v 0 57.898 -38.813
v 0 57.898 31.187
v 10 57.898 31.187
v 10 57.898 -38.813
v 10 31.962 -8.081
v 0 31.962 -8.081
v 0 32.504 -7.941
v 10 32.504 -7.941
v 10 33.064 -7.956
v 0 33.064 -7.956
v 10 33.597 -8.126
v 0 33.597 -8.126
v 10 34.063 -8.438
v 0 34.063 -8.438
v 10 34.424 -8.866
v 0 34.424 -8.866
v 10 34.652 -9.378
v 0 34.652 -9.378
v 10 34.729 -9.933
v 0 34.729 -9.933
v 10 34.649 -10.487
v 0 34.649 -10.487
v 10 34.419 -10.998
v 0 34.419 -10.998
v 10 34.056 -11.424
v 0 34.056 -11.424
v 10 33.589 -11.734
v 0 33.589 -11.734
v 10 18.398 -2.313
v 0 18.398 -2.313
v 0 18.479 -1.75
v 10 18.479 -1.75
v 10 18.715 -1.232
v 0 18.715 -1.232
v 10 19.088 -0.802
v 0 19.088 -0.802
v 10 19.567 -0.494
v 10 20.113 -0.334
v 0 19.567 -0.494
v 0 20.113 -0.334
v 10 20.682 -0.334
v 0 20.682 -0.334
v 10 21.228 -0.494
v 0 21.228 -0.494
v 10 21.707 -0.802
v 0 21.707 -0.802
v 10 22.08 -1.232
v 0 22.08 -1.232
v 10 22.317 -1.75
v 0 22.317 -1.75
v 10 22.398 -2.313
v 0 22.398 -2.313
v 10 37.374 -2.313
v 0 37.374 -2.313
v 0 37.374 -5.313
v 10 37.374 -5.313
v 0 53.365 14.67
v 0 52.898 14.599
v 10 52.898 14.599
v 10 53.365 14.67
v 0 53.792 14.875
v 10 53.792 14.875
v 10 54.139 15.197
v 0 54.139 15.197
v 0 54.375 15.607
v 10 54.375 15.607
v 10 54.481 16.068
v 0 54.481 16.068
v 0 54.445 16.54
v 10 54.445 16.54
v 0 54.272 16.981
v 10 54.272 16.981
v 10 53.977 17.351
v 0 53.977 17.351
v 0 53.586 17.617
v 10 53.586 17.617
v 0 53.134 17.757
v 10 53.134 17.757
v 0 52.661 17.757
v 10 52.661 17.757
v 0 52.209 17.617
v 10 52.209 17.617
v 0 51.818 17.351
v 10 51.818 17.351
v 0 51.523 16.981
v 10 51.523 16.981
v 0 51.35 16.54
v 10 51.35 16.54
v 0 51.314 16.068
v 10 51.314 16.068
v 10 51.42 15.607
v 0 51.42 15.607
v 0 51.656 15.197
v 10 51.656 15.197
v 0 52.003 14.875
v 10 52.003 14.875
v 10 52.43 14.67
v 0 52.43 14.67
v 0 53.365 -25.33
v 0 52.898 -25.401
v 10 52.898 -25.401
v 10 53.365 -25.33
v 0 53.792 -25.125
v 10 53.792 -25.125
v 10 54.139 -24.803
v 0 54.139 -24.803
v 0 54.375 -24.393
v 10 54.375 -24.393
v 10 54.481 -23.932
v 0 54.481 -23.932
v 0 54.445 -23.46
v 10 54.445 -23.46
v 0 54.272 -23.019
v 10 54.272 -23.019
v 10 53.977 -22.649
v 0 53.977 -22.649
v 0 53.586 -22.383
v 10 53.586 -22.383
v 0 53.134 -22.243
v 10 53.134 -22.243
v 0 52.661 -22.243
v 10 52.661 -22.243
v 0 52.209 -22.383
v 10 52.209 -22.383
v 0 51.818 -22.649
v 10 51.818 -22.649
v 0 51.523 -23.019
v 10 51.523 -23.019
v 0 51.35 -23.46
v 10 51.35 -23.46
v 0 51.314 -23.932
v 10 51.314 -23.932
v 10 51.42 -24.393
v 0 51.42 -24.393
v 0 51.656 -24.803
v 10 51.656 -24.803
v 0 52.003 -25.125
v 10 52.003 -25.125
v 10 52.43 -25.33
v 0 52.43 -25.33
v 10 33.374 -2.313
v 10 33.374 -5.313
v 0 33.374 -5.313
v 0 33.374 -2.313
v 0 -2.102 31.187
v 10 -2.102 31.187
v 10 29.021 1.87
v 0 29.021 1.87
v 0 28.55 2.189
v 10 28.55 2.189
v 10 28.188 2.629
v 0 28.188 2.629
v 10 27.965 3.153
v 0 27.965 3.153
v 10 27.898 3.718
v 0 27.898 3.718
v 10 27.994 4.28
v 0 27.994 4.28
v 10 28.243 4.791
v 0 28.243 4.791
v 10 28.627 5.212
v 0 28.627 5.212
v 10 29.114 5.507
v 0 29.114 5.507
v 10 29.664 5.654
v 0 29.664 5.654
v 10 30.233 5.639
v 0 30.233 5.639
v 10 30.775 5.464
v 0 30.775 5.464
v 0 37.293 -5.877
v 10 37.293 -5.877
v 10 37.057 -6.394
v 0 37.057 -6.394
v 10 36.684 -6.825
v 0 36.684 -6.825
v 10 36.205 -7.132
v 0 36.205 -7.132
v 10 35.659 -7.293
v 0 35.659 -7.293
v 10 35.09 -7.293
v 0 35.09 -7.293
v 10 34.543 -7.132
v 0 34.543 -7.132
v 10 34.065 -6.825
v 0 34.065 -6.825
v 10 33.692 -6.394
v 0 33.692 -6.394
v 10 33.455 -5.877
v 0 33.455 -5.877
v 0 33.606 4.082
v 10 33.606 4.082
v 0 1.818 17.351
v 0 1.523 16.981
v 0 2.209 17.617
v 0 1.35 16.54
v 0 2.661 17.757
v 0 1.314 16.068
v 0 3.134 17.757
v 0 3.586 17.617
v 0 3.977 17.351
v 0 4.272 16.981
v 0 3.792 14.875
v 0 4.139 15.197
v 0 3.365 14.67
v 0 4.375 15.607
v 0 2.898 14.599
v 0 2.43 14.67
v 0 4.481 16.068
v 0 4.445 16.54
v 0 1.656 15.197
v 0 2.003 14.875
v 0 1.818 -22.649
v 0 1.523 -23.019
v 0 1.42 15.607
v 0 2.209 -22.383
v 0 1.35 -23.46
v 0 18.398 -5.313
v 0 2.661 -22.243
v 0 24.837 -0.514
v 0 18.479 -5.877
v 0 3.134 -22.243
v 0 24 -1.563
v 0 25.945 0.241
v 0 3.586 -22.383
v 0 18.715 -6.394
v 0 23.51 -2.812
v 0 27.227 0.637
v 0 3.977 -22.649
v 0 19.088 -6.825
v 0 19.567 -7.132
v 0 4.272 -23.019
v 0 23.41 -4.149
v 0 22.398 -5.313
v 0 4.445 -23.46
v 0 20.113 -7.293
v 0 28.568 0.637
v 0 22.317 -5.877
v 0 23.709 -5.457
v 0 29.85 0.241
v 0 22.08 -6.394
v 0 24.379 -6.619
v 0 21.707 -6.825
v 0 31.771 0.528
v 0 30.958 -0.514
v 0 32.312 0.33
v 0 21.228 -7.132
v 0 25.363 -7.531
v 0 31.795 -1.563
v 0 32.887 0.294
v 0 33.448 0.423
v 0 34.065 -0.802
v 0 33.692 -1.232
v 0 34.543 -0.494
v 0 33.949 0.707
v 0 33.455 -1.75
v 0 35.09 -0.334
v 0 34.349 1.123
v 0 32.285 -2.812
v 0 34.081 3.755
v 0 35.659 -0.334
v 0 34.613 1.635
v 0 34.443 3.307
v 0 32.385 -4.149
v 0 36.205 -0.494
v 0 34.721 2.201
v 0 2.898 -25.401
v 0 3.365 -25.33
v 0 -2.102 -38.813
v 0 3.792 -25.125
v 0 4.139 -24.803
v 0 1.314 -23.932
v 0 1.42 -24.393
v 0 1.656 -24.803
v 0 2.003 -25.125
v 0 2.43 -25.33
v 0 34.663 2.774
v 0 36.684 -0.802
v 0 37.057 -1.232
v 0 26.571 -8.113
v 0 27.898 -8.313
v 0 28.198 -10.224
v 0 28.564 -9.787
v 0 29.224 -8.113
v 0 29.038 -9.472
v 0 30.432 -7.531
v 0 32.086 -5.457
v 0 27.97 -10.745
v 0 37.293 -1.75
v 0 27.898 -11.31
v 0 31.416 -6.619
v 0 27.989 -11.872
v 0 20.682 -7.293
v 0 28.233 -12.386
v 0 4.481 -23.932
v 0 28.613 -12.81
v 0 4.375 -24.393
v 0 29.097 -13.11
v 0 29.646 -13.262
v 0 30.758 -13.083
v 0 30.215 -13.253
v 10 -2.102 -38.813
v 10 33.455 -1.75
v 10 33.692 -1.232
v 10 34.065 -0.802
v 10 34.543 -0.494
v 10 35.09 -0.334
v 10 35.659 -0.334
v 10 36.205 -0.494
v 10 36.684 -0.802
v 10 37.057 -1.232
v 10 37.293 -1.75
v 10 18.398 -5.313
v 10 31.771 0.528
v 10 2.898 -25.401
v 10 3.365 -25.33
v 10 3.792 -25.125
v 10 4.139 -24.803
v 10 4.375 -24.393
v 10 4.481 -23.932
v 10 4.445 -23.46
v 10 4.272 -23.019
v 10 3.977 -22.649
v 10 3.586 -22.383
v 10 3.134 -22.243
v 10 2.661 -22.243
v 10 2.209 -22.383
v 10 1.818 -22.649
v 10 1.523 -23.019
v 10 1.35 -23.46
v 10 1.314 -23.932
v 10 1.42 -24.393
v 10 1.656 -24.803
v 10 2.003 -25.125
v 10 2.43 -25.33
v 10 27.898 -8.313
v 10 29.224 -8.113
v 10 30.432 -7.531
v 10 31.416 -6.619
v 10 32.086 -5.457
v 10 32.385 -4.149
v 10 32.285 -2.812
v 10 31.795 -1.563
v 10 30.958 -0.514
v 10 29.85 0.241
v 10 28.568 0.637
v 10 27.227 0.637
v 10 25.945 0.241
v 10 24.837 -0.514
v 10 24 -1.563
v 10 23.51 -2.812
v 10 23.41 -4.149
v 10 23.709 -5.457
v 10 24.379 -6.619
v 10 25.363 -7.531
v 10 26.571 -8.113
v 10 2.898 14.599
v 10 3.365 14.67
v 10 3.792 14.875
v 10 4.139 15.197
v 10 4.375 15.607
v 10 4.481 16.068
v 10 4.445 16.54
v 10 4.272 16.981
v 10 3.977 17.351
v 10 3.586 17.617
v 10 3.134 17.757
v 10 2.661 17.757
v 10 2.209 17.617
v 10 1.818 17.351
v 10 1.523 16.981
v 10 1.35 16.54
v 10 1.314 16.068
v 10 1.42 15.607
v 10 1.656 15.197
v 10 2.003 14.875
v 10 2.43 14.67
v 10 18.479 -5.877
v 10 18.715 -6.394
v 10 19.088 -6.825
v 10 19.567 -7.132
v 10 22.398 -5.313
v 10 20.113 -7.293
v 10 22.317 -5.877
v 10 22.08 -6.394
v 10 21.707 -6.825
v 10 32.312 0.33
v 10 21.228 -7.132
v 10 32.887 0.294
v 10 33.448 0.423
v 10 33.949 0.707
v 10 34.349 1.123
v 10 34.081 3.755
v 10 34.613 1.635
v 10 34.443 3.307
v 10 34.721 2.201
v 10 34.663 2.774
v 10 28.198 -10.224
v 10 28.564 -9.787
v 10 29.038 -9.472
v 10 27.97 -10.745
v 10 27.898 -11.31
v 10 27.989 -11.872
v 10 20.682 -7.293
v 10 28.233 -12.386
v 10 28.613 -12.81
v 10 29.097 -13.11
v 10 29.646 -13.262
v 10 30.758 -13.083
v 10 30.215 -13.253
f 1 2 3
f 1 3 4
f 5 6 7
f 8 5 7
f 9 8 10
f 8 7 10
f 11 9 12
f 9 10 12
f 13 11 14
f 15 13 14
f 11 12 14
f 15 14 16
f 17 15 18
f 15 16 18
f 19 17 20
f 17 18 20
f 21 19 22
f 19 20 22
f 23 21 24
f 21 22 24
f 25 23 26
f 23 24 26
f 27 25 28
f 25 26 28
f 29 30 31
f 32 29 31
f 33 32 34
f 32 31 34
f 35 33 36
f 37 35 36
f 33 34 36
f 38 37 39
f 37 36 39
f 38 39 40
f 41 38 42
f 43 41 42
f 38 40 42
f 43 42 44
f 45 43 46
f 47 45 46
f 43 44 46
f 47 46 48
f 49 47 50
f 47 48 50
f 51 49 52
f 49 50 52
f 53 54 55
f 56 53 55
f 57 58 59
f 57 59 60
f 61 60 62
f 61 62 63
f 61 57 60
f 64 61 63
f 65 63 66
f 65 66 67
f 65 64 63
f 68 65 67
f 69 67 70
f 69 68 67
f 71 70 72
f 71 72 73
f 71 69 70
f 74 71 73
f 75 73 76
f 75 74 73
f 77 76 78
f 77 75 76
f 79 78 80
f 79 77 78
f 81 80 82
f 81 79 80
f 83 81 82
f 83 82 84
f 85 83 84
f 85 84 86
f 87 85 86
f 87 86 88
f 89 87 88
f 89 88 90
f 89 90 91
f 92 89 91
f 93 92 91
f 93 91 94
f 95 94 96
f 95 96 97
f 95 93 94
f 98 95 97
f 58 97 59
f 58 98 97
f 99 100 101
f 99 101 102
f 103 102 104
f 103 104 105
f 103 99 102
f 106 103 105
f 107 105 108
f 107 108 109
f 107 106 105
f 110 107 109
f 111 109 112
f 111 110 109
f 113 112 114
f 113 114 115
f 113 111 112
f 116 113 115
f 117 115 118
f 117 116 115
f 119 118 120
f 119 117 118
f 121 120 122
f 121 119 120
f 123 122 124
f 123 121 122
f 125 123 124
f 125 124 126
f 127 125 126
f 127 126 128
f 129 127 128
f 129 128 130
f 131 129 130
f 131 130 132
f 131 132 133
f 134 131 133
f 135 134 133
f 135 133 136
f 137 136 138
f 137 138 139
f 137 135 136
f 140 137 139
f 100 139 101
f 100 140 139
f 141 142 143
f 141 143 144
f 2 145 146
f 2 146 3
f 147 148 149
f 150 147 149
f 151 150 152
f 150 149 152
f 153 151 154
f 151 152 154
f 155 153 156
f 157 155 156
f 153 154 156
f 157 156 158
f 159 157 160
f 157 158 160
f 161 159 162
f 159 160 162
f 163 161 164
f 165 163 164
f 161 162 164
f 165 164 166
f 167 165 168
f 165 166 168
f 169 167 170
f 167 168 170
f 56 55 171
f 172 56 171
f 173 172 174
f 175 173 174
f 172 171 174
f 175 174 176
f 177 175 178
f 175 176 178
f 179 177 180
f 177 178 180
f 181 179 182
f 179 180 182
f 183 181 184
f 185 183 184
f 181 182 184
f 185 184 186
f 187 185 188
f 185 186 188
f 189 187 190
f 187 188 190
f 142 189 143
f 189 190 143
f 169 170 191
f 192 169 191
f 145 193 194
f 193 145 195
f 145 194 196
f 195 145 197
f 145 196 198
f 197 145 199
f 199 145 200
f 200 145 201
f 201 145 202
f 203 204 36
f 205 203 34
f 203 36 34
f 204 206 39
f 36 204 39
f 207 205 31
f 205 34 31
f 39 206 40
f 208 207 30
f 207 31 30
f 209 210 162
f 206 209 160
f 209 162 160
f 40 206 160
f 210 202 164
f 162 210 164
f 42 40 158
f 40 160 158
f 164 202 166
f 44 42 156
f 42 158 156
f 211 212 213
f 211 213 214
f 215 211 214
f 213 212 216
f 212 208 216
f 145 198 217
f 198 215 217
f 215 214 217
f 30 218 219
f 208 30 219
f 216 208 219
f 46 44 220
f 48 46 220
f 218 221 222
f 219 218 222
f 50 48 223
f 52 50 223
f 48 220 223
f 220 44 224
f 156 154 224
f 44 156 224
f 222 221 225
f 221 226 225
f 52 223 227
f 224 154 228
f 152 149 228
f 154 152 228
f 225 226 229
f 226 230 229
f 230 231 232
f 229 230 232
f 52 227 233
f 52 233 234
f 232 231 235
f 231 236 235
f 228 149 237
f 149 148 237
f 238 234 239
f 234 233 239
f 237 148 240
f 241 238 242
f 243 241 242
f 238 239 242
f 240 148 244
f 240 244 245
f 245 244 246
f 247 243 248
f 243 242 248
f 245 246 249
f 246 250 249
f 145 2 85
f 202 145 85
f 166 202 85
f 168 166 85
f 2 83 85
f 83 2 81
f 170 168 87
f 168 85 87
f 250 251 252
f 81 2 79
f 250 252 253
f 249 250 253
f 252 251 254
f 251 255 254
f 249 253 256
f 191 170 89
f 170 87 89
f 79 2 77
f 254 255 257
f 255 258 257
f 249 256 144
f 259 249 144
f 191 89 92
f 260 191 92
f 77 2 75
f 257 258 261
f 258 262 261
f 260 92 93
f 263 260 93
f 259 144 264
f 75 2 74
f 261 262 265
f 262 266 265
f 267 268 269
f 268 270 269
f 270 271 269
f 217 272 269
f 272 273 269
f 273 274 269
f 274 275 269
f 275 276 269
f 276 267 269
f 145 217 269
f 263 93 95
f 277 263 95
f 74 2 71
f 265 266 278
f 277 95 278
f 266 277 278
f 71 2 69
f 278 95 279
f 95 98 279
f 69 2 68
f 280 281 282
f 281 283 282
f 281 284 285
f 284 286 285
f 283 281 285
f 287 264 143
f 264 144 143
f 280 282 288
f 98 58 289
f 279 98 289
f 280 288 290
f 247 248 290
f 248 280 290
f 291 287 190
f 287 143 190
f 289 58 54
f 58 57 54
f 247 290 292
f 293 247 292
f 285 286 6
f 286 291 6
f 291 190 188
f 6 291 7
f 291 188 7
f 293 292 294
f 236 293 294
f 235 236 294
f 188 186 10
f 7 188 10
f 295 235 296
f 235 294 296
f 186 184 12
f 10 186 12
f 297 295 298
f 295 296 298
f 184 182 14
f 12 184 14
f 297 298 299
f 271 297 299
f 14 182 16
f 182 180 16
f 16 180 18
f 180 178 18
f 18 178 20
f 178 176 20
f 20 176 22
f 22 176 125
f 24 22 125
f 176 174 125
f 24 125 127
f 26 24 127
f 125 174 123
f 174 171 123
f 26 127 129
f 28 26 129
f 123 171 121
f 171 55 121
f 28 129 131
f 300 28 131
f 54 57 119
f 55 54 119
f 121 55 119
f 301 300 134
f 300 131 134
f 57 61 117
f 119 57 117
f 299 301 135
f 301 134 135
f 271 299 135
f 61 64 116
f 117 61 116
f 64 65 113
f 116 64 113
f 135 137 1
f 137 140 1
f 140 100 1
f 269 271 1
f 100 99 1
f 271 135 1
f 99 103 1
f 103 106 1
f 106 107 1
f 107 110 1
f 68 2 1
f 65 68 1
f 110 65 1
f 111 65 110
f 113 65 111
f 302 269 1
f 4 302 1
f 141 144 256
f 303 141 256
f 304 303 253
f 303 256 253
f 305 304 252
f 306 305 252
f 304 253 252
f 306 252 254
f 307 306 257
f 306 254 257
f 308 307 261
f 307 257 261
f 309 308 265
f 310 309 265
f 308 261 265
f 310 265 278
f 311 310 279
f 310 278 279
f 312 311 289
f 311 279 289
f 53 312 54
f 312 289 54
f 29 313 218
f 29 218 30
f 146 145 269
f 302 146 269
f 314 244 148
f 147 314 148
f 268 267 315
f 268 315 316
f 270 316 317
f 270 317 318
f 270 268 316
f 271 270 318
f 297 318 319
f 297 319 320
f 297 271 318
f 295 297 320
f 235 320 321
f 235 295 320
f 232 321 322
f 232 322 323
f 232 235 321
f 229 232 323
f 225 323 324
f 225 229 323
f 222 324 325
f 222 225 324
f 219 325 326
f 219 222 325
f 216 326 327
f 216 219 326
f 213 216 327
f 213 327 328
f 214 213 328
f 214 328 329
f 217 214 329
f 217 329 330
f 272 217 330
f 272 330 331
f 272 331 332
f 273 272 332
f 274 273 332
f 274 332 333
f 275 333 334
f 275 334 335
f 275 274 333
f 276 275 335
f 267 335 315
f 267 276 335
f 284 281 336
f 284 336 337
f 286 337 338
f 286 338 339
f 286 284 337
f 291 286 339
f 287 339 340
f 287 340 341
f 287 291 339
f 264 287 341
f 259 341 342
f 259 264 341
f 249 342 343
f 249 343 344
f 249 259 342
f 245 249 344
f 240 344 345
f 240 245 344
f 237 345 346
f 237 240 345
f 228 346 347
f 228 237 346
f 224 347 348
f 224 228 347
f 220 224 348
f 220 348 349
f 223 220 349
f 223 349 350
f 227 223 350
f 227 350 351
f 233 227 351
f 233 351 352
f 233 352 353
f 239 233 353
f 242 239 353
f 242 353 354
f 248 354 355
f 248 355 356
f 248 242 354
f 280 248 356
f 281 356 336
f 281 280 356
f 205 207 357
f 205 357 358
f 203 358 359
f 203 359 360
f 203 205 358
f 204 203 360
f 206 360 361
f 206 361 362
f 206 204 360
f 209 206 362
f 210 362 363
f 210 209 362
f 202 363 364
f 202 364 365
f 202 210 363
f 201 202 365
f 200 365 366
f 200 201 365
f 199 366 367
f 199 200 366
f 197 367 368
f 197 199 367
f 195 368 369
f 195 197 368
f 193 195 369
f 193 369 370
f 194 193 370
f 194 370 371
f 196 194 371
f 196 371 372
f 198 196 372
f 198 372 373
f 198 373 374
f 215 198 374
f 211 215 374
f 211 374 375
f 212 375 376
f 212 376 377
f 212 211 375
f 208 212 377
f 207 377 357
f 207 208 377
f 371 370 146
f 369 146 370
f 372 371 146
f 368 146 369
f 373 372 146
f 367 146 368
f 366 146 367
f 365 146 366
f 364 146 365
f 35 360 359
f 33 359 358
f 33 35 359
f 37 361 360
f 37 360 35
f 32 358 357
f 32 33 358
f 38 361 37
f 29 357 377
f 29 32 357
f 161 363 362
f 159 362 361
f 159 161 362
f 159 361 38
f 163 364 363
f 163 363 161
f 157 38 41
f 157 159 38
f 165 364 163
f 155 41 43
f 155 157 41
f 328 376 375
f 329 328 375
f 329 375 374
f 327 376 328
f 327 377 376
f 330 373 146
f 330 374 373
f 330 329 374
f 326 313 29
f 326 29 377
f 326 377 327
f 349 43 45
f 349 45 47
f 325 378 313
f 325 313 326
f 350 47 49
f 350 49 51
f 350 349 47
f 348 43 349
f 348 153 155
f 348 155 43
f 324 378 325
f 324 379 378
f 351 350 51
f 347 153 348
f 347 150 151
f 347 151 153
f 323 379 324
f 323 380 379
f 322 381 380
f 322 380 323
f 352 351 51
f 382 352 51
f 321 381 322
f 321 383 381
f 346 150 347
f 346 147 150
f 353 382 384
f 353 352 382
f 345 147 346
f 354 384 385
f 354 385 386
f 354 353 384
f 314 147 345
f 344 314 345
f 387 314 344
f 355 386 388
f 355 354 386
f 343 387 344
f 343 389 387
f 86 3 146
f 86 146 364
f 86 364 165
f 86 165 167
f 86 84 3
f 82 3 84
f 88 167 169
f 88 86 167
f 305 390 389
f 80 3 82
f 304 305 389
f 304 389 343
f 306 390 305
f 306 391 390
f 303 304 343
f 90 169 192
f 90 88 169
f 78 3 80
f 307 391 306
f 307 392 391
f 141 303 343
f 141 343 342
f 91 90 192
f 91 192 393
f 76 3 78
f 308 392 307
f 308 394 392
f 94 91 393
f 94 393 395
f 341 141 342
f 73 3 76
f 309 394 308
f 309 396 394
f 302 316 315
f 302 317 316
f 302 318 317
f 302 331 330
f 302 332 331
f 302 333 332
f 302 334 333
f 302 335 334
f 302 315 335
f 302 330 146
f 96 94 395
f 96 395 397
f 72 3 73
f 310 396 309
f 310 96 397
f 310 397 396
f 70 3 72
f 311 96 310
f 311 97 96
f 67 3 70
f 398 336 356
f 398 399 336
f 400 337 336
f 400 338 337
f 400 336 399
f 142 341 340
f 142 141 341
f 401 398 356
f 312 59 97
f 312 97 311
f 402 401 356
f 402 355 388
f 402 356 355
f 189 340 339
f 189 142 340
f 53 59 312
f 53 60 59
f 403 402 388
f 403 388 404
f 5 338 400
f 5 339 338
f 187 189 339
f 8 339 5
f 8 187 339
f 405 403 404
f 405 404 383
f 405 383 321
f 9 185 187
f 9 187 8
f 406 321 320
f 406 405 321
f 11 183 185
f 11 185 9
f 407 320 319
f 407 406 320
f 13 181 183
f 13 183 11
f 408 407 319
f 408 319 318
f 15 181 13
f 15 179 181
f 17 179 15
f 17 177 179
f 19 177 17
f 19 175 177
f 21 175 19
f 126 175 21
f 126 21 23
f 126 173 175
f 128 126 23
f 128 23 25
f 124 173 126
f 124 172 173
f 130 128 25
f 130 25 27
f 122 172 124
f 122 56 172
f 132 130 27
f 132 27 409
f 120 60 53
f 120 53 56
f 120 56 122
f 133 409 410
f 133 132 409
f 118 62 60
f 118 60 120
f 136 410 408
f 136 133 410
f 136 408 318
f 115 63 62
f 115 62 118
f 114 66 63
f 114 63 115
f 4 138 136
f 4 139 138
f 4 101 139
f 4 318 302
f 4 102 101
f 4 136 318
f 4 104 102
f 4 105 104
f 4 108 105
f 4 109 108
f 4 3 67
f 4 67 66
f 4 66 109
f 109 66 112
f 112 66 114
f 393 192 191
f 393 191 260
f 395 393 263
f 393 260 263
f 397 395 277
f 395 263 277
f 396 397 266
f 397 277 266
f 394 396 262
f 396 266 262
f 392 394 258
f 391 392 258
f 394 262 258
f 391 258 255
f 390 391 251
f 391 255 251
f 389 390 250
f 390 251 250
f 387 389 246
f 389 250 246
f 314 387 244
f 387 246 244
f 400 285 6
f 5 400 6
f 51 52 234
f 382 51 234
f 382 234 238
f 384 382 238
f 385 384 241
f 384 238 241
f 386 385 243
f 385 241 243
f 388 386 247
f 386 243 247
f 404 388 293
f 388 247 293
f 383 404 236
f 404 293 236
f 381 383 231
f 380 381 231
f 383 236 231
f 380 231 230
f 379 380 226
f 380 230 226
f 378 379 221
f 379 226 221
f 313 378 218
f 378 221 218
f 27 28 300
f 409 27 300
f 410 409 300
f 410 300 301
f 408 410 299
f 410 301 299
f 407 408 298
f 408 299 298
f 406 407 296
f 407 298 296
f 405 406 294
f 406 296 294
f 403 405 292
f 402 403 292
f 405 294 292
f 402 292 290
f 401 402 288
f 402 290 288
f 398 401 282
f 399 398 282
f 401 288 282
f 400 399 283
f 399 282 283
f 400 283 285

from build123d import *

# Parameters (mm, degrees)
SKETCH1_W           = 70
SKETCH1_H           = 60
SKETCH1_R           = 1.5875
SKETCH1_R_2         = 4.499999999
BOSS_EXTRUDE1_DEPTH = 10


with BuildPart() as part:
    # Sketch1 → Boss-Extrude1 (new body)
    with BuildSketch(Plane(origin=(0, 0, 0), x_dir=(0, 0, -1), z_dir=(1, 0, 0))):
        with Locations((3.813160791, 27.897530874)):
            Rectangle(SKETCH1_W, SKETCH1_H)
        with Locations((-16.186839209, 52.897530874)):
            Circle(SKETCH1_R, mode=Mode.SUBTRACT)
        with Locations((-16.186839209, 2.897530874)):
            Circle(SKETCH1_R, mode=Mode.SUBTRACT)
        with Locations((23.813160791, 2.897530874)):
            Circle(SKETCH1_R, mode=Mode.SUBTRACT)
        with Locations((23.813160791, 52.897530874)):
            Circle(SKETCH1_R, mode=Mode.SUBTRACT)
        with Locations((3.813160791, 27.897530874)):
            Circle(SKETCH1_R_2, mode=Mode.SUBTRACT)
        with BuildLine():
            Line((-5.464379102, 30.775341326), (-4.081605515, 33.606305024))
            ThreePointArc((-4.081605515, 33.606305024), (-1.369183898, 34.499769949), (-0.528409533, 31.770555947))
            Line((-0.528409533, 31.770555947), (-1.869576404, 29.020756356))
            ThreePointArc((-1.869576404, 29.020756356), (-4.544523089, 28.10012945), (-5.464379102, 30.775341326))
        make_face(mode=Mode.SUBTRACT)
        with BuildLine():
            Line((5.31316079, 18.397530874), (2.313160791, 18.397530874))
            ThreePointArc((2.313160791, 18.397530874), (0.313160792, 20.397530874), (2.313160791, 22.397530873))
            Line((2.313160791, 22.397530873), (5.31316079, 22.397530873))
            ThreePointArc((5.31316079, 22.397530873), (7.313160789, 20.397530874), (5.31316079, 18.397530874))
        make_face(mode=Mode.SUBTRACT)
        with BuildLine():
            Line((5.31316079, 33.374248764), (2.313160791, 33.374248764))
            ThreePointArc((2.313160791, 33.374248764), (0.31316079, 35.374248765), (2.313160791, 37.374248765))
            Line((2.313160791, 37.374248765), (5.31316079, 37.374248765))
            ThreePointArc((5.31316079, 37.374248765), (7.313160791, 35.374248765), (5.31316079, 33.374248764))
        make_face(mode=Mode.SUBTRACT)
        with BuildLine():
            Line((9.471997672, 29.038205562), (8.081045524, 31.961596177))
            ThreePointArc((8.081045524, 31.961596177), (9.113942414, 34.555839775), (11.733632625, 33.589300054))
            Line((11.733632625, 33.589300054), (13.083423708, 30.758314735))
            ThreePointArc((13.083423708, 30.758314735), (12.137765277, 28.092547131), (9.471997672, 29.038205562))
        make_face(mode=Mode.SUBTRACT)
    extrude(amount=BOSS_EXTRUDE1_DEPTH)


solid = part.part
